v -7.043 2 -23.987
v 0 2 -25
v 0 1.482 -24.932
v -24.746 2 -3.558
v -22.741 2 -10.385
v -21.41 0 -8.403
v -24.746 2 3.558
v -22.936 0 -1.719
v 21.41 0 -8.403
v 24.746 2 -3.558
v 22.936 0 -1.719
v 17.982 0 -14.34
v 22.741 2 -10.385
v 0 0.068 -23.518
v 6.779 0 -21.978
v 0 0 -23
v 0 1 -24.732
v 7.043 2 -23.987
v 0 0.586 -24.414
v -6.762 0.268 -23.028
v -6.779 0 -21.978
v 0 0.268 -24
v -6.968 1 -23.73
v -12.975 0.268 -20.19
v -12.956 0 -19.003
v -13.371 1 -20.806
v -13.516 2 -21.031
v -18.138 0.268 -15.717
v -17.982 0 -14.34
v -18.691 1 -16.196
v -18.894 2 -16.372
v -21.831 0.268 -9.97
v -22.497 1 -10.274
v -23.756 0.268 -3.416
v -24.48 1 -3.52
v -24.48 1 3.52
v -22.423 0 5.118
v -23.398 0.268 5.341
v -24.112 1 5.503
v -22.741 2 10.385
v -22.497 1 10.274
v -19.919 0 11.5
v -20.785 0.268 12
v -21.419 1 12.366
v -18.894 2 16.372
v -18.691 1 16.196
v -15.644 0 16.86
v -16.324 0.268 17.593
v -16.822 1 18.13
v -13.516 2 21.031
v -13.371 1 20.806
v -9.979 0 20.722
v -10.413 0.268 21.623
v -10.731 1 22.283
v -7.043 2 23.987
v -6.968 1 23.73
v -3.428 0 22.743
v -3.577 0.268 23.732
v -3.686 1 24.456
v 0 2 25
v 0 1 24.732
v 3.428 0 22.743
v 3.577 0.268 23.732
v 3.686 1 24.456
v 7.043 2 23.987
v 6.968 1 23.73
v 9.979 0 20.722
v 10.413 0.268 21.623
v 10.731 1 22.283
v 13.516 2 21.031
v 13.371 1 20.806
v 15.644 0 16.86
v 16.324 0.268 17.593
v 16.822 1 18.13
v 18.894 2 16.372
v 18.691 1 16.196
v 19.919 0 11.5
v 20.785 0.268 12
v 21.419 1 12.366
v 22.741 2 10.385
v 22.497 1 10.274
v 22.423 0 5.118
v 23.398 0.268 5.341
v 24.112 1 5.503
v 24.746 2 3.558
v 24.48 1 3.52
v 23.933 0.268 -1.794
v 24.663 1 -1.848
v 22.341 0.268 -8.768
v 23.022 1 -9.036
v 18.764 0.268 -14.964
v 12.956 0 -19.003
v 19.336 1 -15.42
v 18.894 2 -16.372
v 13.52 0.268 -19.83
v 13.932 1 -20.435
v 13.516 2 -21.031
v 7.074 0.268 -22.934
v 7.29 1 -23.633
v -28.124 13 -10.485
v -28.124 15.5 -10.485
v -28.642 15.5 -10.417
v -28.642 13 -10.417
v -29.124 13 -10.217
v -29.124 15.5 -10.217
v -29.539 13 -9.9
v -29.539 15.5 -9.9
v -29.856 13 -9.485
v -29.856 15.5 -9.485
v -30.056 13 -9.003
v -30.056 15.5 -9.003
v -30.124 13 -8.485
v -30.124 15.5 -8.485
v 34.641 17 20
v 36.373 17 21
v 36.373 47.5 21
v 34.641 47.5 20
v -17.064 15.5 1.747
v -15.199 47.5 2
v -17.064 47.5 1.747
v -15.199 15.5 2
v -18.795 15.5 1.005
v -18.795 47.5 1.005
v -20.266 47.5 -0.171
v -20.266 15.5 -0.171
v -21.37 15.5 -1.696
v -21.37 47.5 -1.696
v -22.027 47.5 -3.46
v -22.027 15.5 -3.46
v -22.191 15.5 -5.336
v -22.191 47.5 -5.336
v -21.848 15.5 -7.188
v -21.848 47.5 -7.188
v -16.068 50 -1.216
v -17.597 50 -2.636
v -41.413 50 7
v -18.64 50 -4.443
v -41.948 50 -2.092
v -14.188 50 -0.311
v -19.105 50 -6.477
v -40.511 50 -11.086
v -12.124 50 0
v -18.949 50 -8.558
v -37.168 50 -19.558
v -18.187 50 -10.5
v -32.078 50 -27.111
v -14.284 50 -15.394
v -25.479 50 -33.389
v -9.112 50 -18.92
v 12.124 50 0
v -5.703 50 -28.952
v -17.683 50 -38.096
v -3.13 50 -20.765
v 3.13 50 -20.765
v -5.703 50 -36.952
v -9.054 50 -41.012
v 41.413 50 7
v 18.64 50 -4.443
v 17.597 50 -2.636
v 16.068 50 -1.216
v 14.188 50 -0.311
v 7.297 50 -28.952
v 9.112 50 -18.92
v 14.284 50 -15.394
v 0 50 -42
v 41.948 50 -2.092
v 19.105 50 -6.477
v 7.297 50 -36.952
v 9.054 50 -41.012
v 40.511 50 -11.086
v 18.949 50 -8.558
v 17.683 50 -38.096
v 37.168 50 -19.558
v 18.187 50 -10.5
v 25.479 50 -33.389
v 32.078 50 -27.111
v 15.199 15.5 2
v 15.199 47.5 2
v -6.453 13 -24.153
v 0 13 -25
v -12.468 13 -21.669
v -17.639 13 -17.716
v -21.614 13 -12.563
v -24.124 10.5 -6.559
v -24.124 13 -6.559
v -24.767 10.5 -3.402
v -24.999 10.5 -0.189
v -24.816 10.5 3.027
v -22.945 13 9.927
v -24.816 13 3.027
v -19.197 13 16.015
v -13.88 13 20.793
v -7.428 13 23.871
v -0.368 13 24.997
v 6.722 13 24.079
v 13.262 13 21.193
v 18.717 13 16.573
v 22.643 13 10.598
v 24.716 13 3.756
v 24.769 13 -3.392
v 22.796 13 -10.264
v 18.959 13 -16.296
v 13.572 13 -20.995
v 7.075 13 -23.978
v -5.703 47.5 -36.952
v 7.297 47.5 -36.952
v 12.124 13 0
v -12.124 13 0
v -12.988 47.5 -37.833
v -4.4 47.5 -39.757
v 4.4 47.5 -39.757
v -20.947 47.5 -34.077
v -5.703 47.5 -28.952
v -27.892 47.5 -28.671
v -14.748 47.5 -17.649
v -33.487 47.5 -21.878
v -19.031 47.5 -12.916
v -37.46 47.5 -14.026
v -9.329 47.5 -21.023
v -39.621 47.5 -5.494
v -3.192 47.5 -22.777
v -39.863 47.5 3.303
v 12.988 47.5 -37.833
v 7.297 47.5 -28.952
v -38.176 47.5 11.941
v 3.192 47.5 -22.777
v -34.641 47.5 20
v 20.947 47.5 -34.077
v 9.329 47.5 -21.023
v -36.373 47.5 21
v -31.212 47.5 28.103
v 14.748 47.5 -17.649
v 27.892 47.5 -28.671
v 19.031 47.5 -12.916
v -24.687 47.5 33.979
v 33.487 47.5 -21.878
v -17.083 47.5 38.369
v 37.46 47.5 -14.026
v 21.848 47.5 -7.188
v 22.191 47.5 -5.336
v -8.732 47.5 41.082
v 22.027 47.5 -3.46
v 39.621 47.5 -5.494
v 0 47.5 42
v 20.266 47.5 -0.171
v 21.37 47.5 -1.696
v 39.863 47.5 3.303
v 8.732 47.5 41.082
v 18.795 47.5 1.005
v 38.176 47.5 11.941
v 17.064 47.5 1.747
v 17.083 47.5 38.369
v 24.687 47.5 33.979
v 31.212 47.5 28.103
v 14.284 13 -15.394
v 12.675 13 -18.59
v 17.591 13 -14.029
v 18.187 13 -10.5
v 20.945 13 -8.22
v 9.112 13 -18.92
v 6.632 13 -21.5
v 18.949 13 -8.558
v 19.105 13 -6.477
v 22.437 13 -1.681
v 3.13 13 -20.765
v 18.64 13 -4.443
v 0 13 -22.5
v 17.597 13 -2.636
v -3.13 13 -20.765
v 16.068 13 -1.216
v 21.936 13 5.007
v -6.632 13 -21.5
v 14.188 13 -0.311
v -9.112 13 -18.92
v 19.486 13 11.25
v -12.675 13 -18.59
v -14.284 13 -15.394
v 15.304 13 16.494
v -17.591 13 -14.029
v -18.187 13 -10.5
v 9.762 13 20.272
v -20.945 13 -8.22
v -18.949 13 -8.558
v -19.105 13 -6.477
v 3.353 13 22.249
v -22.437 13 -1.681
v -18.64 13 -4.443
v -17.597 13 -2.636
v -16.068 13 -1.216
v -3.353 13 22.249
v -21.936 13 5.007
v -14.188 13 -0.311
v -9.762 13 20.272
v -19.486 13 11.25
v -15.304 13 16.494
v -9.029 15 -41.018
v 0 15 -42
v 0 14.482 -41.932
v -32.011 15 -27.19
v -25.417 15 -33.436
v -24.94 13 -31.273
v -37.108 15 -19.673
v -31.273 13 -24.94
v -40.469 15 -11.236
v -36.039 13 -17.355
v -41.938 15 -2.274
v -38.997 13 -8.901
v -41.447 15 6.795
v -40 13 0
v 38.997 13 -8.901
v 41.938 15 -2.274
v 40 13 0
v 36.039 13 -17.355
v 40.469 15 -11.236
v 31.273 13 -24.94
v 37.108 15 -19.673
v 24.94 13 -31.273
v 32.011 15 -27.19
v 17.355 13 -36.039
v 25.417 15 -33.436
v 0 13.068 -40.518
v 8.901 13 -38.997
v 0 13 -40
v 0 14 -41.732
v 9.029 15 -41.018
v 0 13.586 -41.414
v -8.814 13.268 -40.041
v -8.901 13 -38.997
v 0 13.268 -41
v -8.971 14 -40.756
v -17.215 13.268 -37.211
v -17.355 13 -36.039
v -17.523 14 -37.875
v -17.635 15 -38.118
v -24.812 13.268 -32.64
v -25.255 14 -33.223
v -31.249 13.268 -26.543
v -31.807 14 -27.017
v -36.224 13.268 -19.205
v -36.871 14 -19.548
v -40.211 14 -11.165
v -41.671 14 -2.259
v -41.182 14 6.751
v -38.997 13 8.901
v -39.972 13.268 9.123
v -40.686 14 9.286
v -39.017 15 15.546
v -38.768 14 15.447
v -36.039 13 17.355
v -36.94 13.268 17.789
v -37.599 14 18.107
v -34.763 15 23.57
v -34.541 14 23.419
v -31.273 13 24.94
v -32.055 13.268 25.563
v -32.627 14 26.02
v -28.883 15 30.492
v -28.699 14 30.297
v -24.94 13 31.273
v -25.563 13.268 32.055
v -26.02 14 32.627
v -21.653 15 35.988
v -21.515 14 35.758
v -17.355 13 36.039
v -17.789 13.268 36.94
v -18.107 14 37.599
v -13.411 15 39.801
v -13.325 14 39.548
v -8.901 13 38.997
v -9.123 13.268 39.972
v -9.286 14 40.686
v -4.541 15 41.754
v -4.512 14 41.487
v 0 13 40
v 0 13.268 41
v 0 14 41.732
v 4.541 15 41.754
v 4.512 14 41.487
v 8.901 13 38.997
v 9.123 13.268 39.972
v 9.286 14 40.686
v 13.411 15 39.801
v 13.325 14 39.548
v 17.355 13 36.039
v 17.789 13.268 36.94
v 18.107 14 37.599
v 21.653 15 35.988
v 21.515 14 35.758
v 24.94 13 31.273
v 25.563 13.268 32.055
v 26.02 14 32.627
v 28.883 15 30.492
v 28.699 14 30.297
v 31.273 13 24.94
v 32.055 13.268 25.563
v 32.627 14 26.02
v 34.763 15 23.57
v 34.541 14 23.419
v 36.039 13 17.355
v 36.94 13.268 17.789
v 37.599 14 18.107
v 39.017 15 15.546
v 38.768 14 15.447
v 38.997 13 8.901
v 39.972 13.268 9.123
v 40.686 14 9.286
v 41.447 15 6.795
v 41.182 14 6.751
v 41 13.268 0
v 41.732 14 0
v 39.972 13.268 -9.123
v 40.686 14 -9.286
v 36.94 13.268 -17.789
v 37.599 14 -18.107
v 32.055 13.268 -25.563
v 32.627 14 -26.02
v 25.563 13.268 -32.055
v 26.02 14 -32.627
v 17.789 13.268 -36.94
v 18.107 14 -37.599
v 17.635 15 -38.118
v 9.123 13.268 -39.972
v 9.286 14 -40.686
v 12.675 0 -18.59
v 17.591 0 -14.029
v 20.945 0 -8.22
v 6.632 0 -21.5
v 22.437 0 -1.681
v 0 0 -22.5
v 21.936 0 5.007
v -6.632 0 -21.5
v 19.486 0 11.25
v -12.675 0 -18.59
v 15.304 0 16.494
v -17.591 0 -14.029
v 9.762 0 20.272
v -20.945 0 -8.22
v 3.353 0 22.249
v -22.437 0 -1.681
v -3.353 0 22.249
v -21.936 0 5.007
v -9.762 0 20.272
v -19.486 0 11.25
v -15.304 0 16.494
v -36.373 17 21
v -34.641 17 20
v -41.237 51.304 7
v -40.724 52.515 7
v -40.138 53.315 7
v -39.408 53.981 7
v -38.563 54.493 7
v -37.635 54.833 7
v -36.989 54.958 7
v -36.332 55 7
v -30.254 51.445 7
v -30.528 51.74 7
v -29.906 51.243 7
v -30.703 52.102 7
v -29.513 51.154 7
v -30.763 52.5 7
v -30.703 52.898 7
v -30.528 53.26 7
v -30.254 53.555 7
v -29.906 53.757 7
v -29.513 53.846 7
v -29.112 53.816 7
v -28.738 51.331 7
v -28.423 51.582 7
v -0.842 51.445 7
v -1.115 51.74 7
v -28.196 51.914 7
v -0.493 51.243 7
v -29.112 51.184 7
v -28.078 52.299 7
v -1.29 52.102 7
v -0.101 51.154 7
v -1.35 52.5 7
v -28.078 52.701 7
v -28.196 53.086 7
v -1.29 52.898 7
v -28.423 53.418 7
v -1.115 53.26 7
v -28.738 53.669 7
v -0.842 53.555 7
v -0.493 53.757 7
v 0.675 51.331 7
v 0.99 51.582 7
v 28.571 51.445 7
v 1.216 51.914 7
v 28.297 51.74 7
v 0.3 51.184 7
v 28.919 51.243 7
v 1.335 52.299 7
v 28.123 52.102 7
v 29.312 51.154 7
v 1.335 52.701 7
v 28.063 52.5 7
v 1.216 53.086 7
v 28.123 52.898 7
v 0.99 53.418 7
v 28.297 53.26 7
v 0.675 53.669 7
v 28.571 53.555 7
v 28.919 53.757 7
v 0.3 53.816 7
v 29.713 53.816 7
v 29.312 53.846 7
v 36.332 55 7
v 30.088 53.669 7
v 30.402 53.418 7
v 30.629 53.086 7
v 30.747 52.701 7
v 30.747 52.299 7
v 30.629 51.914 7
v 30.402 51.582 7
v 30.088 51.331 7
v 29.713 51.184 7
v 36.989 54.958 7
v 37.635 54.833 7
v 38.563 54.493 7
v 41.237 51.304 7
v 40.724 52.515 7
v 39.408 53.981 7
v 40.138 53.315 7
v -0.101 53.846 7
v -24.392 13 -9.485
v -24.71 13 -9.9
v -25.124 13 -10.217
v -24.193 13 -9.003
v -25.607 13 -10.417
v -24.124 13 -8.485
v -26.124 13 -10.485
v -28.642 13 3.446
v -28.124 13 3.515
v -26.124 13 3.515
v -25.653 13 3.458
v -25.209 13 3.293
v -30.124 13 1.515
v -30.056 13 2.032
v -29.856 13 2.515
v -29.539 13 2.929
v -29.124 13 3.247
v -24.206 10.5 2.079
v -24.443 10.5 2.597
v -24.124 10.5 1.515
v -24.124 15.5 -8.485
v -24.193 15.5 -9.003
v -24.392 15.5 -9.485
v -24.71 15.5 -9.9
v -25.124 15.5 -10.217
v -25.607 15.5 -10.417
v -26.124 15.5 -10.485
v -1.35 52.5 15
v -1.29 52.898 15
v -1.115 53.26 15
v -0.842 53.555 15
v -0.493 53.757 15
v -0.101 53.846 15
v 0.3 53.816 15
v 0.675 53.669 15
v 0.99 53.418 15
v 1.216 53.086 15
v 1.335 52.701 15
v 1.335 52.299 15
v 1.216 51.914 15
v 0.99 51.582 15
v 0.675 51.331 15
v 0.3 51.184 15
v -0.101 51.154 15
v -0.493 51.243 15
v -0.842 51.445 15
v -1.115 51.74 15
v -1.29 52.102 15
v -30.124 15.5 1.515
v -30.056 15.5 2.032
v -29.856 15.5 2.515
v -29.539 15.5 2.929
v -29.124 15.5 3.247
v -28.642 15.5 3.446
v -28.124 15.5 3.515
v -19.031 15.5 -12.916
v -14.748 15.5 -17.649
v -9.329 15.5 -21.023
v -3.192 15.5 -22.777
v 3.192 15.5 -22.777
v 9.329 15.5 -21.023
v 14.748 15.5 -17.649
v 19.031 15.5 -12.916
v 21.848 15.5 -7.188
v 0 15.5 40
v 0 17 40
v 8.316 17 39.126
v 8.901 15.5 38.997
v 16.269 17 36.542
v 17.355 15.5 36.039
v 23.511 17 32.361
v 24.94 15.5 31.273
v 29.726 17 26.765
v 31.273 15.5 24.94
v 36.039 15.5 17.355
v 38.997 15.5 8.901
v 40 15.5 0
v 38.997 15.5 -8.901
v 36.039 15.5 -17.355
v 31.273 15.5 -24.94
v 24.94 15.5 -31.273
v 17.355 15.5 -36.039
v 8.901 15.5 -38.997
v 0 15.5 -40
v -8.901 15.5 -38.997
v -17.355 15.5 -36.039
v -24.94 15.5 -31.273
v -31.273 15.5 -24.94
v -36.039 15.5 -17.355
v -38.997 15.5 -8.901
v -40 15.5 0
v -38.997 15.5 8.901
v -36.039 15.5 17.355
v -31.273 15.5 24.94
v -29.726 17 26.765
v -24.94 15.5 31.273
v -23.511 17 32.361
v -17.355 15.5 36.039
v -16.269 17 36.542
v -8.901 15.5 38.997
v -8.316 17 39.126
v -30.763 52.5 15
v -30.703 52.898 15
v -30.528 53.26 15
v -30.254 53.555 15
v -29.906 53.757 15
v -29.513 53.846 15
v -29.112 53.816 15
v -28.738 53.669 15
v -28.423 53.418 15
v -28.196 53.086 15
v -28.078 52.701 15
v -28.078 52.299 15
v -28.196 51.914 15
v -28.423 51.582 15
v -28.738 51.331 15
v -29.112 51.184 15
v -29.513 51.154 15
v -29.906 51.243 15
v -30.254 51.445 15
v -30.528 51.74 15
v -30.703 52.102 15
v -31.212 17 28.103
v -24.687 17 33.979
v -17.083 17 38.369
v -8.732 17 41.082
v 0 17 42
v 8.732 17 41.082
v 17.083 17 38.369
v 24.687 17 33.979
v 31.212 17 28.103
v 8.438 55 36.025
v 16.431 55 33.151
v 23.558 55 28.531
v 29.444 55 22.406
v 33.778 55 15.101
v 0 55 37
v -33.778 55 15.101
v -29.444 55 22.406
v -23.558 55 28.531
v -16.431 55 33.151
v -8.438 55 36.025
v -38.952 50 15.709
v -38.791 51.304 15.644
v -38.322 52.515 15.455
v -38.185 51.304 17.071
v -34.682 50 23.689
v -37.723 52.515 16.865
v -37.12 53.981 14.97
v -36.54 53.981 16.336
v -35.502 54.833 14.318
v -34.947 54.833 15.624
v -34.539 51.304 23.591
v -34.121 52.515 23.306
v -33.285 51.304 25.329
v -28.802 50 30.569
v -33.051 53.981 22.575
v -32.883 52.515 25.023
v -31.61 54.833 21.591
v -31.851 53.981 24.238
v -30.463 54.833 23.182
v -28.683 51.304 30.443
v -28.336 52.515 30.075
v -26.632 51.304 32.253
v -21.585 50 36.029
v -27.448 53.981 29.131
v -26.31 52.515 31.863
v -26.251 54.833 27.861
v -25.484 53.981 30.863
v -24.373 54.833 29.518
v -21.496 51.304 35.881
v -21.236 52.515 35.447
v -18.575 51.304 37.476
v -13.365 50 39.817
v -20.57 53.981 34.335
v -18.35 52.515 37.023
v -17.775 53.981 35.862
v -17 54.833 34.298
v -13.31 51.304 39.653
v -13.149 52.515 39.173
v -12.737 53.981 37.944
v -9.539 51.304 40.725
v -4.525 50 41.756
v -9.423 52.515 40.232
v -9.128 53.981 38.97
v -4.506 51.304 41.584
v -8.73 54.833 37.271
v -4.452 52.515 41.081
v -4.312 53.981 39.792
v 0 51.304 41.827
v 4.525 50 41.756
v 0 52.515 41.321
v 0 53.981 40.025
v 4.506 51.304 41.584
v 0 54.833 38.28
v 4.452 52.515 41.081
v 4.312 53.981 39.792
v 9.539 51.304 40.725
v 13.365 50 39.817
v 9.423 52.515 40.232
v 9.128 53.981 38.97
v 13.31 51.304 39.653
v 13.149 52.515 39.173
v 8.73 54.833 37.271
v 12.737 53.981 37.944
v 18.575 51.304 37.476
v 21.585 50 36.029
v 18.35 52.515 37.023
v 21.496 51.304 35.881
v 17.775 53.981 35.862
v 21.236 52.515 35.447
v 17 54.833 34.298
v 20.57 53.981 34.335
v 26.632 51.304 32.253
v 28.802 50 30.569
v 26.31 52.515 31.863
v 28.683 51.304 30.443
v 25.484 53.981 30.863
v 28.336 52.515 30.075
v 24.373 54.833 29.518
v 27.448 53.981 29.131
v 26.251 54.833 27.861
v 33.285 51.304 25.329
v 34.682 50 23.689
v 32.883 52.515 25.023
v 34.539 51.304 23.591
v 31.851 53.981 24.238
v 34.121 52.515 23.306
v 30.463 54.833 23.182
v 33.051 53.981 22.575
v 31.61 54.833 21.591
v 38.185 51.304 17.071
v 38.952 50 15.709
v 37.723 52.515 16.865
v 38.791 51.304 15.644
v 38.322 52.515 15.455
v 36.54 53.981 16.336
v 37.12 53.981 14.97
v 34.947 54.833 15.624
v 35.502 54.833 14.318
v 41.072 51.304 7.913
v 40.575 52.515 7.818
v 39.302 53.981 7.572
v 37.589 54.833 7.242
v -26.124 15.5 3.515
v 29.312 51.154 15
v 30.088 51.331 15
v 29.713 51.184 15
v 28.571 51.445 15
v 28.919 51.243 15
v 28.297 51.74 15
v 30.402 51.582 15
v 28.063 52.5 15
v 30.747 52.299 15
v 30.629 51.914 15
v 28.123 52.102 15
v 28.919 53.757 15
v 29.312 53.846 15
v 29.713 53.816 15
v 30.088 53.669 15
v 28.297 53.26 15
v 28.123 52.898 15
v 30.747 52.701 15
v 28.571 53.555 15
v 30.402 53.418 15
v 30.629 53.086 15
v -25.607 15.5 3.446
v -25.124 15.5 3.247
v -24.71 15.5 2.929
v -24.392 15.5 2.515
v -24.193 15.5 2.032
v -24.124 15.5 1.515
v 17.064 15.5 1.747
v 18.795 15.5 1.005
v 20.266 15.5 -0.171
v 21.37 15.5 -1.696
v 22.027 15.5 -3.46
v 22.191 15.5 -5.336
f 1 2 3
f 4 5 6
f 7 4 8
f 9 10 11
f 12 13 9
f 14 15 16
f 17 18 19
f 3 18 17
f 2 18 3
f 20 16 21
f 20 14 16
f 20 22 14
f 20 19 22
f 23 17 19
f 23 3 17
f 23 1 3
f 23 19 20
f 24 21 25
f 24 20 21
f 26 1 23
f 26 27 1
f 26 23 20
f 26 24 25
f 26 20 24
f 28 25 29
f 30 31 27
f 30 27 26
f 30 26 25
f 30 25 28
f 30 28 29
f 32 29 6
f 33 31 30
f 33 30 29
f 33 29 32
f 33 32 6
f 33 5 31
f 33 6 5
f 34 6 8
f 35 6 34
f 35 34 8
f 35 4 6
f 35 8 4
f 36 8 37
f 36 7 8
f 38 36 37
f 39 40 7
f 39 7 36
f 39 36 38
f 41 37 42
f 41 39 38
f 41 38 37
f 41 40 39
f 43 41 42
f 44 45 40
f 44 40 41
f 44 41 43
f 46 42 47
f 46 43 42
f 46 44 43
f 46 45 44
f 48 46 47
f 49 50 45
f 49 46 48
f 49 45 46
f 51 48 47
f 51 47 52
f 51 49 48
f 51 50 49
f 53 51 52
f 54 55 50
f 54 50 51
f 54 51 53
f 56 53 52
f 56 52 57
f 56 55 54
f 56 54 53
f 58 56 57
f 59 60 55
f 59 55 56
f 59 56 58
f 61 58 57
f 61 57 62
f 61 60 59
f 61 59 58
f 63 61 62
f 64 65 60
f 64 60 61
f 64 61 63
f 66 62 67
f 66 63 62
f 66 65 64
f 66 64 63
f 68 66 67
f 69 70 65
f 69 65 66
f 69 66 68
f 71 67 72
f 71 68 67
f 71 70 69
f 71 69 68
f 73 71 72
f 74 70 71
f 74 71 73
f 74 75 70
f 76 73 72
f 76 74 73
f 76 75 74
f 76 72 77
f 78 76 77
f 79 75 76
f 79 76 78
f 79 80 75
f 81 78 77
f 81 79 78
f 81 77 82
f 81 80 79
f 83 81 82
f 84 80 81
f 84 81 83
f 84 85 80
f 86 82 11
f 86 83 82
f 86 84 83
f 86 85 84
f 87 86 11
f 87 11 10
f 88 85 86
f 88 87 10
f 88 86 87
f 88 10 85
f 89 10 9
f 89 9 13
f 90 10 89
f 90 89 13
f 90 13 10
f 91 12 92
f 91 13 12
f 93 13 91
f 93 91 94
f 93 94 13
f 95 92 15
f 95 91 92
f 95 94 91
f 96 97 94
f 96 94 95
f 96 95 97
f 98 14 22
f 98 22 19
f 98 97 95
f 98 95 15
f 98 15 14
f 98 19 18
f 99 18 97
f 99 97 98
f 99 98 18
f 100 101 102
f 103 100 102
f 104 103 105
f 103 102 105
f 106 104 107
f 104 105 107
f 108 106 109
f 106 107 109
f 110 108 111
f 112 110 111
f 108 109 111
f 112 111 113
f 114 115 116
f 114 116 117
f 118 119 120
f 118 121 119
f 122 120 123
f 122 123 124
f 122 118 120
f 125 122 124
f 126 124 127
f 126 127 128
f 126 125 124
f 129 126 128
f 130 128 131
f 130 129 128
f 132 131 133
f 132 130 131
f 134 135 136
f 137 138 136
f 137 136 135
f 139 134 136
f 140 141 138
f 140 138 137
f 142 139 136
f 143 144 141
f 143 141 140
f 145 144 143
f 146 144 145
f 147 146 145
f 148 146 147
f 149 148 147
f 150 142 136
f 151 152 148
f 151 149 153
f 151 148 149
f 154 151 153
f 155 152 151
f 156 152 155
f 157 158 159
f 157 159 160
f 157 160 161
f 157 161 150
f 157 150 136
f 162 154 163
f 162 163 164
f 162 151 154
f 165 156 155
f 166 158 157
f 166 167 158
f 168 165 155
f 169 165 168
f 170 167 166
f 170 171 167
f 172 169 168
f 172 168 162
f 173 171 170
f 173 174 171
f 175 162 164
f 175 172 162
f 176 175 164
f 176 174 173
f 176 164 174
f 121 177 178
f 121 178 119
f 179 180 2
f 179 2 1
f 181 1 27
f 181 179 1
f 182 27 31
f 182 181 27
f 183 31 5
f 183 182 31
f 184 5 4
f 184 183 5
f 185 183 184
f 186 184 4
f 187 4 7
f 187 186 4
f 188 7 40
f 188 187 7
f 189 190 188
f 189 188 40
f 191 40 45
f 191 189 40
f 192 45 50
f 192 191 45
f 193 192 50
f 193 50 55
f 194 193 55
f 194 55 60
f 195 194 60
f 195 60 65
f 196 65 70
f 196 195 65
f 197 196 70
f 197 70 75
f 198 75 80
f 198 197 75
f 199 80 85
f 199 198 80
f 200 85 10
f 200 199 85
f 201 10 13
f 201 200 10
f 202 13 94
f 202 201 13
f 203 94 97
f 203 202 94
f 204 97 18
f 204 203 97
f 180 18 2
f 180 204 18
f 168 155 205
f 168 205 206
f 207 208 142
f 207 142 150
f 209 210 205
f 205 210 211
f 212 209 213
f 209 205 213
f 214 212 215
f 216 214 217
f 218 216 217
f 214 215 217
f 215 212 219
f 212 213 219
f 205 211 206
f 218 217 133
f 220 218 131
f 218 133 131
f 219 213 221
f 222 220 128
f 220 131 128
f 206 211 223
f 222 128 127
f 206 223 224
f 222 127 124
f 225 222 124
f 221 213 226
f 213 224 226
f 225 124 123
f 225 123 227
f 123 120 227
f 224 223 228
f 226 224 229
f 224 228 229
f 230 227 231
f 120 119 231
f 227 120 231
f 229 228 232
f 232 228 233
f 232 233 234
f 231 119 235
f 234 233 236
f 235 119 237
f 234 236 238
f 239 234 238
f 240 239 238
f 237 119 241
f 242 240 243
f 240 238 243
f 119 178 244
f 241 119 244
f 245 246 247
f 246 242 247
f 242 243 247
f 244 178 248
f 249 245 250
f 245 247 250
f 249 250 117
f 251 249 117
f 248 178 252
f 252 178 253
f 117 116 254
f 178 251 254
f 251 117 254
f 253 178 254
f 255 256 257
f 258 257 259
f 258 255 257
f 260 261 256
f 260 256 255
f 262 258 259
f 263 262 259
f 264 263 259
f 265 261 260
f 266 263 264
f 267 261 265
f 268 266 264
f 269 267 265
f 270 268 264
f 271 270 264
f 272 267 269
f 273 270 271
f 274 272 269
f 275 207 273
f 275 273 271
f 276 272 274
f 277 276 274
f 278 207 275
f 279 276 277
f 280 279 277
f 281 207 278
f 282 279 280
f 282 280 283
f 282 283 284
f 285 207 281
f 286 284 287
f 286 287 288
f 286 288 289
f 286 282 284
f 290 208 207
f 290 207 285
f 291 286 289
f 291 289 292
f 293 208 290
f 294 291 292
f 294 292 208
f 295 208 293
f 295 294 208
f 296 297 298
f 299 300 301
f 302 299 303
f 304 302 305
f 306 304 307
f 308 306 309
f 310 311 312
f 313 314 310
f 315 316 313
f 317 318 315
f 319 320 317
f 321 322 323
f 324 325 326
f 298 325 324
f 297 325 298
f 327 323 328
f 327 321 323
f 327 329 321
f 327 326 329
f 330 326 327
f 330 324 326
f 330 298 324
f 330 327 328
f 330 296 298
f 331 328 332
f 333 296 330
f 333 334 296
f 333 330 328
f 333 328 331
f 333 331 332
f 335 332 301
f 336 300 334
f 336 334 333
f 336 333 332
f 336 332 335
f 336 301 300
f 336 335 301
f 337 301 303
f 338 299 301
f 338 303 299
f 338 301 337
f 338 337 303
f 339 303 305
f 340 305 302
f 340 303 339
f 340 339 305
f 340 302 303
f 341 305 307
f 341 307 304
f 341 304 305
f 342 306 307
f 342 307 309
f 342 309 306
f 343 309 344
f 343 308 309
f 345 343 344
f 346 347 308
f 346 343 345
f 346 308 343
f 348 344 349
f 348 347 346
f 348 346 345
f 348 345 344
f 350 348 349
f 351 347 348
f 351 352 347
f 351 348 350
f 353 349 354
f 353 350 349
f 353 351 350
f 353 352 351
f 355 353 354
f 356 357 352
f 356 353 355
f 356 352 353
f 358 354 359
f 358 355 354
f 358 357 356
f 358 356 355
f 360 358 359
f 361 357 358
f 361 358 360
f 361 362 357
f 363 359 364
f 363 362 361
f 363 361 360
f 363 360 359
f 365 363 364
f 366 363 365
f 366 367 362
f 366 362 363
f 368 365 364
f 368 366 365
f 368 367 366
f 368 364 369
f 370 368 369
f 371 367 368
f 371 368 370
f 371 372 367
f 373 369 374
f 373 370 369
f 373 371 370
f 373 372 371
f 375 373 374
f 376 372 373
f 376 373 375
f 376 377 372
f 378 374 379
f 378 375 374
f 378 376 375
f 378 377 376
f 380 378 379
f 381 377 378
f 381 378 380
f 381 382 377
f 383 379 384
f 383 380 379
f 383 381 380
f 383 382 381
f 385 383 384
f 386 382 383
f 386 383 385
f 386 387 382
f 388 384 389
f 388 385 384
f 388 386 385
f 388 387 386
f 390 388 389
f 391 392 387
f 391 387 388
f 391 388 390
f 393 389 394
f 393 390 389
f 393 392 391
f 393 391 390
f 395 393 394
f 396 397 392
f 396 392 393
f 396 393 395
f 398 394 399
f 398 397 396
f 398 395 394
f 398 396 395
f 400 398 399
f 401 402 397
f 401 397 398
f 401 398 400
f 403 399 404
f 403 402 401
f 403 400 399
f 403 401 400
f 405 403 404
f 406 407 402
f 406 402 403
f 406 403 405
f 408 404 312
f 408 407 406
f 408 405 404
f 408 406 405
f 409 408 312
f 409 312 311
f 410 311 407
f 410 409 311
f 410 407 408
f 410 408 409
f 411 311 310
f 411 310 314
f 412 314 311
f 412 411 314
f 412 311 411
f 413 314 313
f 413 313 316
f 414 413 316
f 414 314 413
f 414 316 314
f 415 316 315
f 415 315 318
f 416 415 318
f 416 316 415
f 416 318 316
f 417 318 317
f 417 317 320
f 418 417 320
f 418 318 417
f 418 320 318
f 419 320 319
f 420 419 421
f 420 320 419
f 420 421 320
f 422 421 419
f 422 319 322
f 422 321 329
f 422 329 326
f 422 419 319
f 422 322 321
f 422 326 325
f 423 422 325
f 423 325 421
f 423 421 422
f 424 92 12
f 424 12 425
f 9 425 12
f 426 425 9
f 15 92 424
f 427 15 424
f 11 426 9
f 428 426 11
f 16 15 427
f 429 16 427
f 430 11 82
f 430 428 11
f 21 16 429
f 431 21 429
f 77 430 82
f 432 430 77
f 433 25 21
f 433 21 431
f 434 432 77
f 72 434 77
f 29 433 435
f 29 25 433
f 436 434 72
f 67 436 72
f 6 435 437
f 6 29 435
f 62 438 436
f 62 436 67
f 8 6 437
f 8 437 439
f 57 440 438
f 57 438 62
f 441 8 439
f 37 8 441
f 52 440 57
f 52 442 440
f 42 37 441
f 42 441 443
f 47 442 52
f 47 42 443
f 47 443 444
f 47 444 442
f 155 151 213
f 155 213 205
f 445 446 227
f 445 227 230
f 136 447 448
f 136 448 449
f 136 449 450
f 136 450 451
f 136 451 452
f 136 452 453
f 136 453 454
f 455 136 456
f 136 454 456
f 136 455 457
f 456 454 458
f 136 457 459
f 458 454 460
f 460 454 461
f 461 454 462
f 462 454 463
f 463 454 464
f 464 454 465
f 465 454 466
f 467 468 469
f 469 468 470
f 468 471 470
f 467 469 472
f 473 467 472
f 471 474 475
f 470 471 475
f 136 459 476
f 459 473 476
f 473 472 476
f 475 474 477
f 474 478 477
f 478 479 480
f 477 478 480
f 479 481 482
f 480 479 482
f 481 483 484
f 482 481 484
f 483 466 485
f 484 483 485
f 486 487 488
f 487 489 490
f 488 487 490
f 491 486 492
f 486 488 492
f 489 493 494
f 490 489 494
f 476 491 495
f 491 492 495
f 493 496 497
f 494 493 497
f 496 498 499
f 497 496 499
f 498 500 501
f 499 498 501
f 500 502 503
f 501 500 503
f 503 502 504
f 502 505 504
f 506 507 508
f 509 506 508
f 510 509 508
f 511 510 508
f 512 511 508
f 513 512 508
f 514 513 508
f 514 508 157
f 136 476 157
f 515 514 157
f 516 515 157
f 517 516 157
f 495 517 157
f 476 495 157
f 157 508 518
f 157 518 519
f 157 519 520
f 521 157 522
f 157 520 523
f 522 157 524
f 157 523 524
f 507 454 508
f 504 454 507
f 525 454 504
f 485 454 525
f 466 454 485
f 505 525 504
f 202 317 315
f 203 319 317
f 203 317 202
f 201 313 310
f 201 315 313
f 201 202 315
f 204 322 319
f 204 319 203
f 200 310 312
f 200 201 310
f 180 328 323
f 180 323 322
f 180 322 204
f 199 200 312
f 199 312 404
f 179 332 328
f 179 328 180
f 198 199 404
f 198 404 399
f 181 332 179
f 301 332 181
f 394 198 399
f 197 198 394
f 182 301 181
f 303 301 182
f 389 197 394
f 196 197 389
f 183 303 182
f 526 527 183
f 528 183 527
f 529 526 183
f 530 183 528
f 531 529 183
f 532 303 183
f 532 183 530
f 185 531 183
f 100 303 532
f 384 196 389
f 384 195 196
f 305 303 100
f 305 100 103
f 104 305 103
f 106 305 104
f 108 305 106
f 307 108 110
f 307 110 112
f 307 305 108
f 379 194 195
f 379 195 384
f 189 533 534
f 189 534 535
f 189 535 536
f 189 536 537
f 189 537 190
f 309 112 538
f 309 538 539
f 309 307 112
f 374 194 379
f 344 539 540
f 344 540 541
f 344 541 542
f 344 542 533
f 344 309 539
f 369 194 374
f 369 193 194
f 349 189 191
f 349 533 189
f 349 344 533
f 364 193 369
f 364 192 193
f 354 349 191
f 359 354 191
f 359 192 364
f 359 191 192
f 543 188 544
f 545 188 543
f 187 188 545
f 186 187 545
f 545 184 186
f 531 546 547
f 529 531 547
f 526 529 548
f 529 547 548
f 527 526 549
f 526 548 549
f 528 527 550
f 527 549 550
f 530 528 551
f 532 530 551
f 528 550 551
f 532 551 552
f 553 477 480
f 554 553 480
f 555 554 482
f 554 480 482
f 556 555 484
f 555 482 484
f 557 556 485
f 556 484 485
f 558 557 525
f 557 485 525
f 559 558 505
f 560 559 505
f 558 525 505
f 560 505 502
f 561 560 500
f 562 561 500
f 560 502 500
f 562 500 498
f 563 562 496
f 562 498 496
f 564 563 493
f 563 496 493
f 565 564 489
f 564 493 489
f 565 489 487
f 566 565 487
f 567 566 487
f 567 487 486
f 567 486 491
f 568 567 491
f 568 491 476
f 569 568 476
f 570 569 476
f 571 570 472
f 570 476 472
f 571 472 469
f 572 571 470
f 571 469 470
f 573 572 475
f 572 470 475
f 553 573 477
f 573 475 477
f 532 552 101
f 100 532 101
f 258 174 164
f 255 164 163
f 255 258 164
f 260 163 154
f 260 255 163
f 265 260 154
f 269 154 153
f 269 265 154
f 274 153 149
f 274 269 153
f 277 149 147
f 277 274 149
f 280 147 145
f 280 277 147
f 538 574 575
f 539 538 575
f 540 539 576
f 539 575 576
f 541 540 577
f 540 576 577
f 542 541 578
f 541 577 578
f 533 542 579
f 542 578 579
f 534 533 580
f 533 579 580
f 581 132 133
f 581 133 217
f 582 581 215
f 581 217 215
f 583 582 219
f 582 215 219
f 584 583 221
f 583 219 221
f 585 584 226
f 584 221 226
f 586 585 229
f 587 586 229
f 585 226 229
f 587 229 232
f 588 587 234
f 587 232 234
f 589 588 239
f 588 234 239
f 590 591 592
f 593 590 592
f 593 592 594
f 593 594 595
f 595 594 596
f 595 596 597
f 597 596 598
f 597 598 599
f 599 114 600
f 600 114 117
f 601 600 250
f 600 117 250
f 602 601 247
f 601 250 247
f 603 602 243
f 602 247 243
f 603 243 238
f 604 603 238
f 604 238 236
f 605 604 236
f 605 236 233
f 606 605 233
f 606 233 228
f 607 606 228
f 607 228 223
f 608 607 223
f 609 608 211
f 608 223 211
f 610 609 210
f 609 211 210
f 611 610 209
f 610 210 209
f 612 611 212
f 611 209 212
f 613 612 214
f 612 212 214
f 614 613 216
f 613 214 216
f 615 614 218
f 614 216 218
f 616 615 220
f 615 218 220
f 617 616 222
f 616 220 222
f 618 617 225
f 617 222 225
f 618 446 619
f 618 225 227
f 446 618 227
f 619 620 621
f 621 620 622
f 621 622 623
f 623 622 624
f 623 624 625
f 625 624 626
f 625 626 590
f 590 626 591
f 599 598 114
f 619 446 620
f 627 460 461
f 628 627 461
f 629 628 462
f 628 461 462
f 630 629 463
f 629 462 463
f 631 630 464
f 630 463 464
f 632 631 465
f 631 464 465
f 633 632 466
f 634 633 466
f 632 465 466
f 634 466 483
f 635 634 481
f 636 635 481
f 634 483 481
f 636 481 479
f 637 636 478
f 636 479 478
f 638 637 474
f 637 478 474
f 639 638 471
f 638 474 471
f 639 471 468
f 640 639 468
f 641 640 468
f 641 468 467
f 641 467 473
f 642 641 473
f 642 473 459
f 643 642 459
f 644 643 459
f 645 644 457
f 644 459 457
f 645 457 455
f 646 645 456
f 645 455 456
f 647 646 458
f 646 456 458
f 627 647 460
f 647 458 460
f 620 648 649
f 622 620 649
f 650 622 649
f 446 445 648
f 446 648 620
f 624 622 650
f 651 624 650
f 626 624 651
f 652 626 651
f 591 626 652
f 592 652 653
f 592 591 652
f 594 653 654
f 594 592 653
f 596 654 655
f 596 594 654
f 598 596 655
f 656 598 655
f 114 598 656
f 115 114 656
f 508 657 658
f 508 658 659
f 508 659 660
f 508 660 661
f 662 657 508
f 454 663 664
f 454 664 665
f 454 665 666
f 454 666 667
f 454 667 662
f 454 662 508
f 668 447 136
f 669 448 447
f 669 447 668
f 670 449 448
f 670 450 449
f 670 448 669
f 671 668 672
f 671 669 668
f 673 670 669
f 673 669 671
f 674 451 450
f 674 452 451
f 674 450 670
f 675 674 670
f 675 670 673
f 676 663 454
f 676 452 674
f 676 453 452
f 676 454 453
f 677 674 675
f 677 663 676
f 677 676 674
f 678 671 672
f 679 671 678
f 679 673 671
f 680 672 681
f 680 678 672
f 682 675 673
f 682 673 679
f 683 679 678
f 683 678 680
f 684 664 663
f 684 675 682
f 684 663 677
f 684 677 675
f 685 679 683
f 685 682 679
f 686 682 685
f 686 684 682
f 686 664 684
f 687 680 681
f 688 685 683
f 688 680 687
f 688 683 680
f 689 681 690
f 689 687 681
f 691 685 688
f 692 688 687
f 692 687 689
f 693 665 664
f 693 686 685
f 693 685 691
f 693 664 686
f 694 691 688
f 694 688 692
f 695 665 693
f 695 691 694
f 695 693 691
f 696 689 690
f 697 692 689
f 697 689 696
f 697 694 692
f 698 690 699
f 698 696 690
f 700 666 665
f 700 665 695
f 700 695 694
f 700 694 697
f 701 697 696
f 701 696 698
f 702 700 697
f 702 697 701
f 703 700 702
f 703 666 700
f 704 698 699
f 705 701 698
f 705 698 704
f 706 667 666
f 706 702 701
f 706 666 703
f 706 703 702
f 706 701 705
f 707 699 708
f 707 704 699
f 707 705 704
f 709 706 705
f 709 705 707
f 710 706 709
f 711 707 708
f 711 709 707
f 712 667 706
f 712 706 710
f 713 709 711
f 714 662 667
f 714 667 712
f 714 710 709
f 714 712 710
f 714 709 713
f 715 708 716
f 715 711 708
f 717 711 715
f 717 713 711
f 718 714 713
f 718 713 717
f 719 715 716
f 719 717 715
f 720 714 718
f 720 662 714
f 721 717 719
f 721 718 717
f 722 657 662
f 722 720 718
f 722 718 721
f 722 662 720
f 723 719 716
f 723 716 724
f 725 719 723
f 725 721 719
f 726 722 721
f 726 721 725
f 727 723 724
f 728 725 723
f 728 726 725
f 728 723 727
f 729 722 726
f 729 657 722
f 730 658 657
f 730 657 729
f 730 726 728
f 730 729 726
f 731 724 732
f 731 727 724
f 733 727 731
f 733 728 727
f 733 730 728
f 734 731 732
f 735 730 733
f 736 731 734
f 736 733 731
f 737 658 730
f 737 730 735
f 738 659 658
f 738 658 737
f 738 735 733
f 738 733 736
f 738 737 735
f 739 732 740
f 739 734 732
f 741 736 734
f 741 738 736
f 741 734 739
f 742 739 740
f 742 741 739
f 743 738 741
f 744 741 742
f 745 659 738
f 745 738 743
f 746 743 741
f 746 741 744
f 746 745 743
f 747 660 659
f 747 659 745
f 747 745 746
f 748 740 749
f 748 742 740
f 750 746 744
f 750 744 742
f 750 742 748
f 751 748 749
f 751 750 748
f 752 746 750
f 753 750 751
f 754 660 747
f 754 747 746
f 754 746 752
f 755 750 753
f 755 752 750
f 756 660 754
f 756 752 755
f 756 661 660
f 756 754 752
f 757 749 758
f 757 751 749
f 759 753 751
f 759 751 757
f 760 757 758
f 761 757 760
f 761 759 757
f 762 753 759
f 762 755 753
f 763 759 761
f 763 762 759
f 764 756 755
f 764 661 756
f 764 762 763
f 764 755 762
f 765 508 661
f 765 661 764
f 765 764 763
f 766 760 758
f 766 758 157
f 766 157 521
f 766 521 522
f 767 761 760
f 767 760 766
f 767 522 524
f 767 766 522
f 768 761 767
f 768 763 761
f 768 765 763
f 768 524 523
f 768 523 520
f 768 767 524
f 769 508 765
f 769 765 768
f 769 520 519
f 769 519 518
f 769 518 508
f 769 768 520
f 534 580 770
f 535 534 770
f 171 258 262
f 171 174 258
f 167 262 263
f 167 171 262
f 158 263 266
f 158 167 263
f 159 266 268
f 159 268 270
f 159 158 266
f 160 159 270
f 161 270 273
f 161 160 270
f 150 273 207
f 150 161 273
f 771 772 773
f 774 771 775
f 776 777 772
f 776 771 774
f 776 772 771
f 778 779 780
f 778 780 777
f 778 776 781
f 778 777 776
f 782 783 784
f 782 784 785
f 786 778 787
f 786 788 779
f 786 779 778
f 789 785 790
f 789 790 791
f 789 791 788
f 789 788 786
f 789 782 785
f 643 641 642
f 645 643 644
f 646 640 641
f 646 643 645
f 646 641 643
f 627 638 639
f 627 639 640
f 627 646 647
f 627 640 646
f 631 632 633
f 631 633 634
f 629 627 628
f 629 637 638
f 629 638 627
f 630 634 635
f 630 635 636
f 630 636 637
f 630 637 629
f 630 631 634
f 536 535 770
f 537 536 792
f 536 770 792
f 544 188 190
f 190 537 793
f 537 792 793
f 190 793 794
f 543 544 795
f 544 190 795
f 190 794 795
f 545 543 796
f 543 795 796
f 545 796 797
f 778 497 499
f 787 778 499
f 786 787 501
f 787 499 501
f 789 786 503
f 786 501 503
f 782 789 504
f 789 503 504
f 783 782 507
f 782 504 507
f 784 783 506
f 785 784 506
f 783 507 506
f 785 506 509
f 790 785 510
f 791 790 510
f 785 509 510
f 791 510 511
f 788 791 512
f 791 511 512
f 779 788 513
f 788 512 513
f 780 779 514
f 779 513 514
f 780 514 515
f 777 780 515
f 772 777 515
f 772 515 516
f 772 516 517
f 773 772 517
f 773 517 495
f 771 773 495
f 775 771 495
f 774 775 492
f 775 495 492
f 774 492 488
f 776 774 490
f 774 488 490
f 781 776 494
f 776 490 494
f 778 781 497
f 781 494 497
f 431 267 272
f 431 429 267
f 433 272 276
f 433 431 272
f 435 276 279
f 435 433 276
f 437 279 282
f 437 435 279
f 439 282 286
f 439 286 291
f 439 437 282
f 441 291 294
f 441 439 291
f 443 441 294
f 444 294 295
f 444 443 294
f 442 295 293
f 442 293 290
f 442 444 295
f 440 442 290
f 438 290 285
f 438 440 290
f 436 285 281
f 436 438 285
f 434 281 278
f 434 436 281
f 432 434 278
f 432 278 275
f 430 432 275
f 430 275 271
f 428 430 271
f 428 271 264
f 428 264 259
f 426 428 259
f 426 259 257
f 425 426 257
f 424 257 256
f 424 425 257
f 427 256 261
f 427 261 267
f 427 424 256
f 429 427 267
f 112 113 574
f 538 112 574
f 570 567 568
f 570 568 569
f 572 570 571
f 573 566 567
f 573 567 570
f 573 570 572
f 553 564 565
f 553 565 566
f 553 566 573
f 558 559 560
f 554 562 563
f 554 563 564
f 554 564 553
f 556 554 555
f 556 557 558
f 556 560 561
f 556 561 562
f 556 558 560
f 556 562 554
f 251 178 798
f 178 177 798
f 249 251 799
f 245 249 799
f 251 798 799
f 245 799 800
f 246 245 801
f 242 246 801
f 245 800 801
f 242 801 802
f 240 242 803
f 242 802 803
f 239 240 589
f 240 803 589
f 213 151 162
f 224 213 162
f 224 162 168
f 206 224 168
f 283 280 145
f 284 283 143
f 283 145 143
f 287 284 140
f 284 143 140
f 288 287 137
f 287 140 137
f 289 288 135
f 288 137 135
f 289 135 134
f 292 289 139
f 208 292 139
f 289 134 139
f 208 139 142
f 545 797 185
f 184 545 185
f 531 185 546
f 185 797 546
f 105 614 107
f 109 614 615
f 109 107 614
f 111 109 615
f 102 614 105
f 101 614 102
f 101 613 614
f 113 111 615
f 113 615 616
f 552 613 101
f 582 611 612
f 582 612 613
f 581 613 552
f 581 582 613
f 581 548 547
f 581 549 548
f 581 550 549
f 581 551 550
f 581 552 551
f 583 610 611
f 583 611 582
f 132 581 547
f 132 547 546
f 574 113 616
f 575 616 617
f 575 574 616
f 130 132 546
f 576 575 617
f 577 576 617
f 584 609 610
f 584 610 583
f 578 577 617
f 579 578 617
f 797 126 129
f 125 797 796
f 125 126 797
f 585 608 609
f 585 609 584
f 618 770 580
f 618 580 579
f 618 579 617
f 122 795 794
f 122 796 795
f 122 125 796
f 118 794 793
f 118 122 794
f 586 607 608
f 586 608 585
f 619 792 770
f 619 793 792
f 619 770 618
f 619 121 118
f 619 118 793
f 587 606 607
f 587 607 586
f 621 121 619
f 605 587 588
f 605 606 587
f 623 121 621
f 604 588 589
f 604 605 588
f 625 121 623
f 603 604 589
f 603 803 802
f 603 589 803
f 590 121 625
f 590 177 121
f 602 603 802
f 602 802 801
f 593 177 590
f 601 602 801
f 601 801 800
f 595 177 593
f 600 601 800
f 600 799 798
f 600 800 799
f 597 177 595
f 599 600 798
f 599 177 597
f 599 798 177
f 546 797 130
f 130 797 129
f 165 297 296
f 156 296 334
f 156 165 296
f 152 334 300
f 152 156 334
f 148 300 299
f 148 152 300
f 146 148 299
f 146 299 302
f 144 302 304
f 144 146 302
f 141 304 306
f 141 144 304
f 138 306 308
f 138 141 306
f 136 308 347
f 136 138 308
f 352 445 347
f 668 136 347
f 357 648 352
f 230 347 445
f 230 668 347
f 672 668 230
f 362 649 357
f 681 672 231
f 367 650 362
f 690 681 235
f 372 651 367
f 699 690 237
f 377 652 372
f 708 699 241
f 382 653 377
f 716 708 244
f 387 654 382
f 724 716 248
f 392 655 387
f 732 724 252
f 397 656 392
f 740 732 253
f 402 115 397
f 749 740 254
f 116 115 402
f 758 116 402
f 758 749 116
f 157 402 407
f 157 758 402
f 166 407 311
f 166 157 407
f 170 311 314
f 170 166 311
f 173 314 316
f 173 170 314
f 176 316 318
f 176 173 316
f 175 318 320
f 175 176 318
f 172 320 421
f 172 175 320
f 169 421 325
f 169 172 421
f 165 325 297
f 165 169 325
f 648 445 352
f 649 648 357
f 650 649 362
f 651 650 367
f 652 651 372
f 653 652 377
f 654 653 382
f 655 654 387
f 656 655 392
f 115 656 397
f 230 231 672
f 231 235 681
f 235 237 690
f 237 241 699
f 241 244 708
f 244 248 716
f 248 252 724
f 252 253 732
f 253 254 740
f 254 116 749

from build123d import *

# Parameters (mm, degrees)
CUT_EXTRUDE1_DEPTH  = 5
CUT_EXTRUDE3_DEPTH  = 45
SKETCH8_R           = 40
CUT_EXTRUDE4_DEPTH  = 32
FILLET1_R           = 7
FILLET2_R           = 7
CUT_REVOLVE1_START  = 17
CUT_REVOLVE1_DEPTH  = 30.5
CUT_EXTRUDE12_DEPTH = 5
SKETCH18_W          = 13
SKETCH18_H          = 8
CUT_EXTRUDE13_DEPTH = 5
SKETCH20_W          = 84
SKETCH20_H          = 7
CUT_EXTRUDE15_DEPTH = 5
SKETCH19_R          = 1.35
CUT_EXTRUDE14_DEPTH = 8


# Read off the part's stored shape, not the designer's step: Cut-Revolve1
with BuildPart() as part:
    # Sketch1 → Revolve1 (revolve)
    with BuildSketch(Plane.XY, mode=Mode.PRIVATE) as revolve1_sk:
        with BuildLine():
            Line((22.5, 0), (23, 0))
            ThreePointArc((23, 0), (24.414213562, 0.585786438), (25, 2))
            Line((25, 2), (25, 13))
            Line((25, 13), (40, 13))
            ThreePointArc((40, 13), (41.414213562, 13.585786438), (42, 15))
            Line((42, 15), (42, 50))
            ThreePointArc((42, 50), (40.535533906, 53.535533906), (37, 55))
            Line((37, 55), (0, 55))
            Line((0, 55), (0, 13))
            Line((0, 13), (22.5, 13))
            Line((22.5, 13), (22.5, 0))
        make_face()
    revolve(revolve1_sk.sketch.rotate(Axis((0, 2, 0), (0, 1, 0)), 90), axis=Axis((0, 2, 0), (0, 1, 0)))

    # Sketch5 → Cut-Extrude1 (cut)
    with BuildSketch(Plane(origin=(0, 55, 0), x_dir=(1, 0, 0), z_dir=(0, 1, 0))):
        with BuildLine():
            Line((-42, 0), (-40, 0))
            Line((-40, 0), (40, 0))
            Line((40, 0), (42, 0))
            ThreePointArc((42, 0), (0, 42), (-42, 0))
        make_face()
    extrude(amount=-CUT_EXTRUDE1_DEPTH, mode=Mode.SUBTRACT)

    # Sketch7 → Cut-Extrude3 (cut)
    with BuildSketch(Plane.XZ.offset(-13)):
        with BuildLine():
            Line((-21, 0), (21, 0))
            ThreePointArc((21, 0), (0, -21), (-21, 0))
        make_face()
    extrude(amount=-CUT_EXTRUDE3_DEPTH, mode=Mode.SUBTRACT)

    # Sketch8 → Cut-Extrude4 (cut)
    with BuildSketch(Plane(origin=(0, 47.5, 0), x_dir=(1, 0, 0), z_dir=(0, 1, 0))):
        with Locations(Location((0, 0, 0), (0, 0, 270))):
            Circle(SKETCH8_R)
        with BuildLine():
            Line((22.912878475, -2), (-22.912878475, -2))
            ThreePointArc((-22.912878475, -2), (0, 23), (22.912878475, -2))
        make_face(mode=Mode.SUBTRACT)
    extrude(amount=-CUT_EXTRUDE4_DEPTH, mode=Mode.SUBTRACT)

    # Fillet1
    fillet1_edges = [part.edges().sort_by_distance(p)[0] for p in [
        (21, 31.5, 0),
        (-21, 31.5, 0),
    ]]
    fillet(fillet1_edges, radius=FILLET1_R)

    # Fillet2
    fillet2_edges = [part.edges().sort_by_distance(p)[0] for p in [
        (-22.912878475, 31.5, 2),
        (22.912878475, 31.5, 2),
    ]]
    fillet(fillet2_edges, radius=FILLET2_R)

    # Cut-Revolve1 outline → Cut-Revolve1 (cut)
    with BuildSketch(Plane(origin=(0, 0, 0), x_dir=(1, 0, 0), z_dir=(0, 1, 0)).offset(CUT_REVOLVE1_START)):
        with BuildLine():
            Line((-34.641016151, -20), (-36.373066959, -21))
            ThreePointArc((-36.373066959, -21), (0, -42), (36.373066959, -21))
            Line((36.373066959, -21), (34.641016151, -20))
            ThreePointArc((34.641016151, -20), (0, -40), (-34.641016151, -20))
        make_face()
    extrude(amount=CUT_REVOLVE1_DEPTH, mode=Mode.SUBTRACT)

    # Sketch15 → Cut-Extrude12 (cut)
    with BuildSketch(Plane(origin=(0, 15.5, 0), x_dir=(1, 0, 0), z_dir=(0, 1, 0))):
        with BuildLine():
            Line((-28.124355653, -3.514579578), (-26.124355653, -3.514579578))
            ThreePointArc((-26.124355653, -3.514579578), (-24.710142091, -2.928793141), (-24.124355653, -1.514579578))
            Line((-24.124355653, -1.514579578), (-24.124355653, 8.485420422))
            ThreePointArc((-24.124355653, 8.485420422), (-24.710142091, 9.899633984), (-26.124355653, 10.485420422))
            Line((-26.124355653, 10.485420422), (-28.124355653, 10.485420422))
            ThreePointArc((-28.124355653, 10.485420422), (-29.538569215, 9.899633984), (-30.124355653, 8.485420422))
            Line((-30.124355653, 8.485420422), (-30.124355653, -1.514579578))
            ThreePointArc((-30.124355653, -1.514579578), (-29.538569215, -2.928793141), (-28.124355653, -3.514579578))
        make_face()
    extrude(amount=-CUT_EXTRUDE12_DEPTH, mode=Mode.SUBTRACT)

    # Sketch18 → Cut-Extrude13 (cut)
    with BuildSketch(Plane(origin=(0, 50, 0), x_dir=(1, 0, 0), z_dir=(0, 1, 0))):
        with Locations((0.796512215, 32.951769165)):
            Rectangle(SKETCH18_W, SKETCH18_H)
    extrude(amount=-CUT_EXTRUDE13_DEPTH, mode=Mode.SUBTRACT)

    # Sketch20 → Cut-Extrude15 (cut)
    with BuildSketch(Plane(origin=(0, 55, 0), x_dir=(1, 0, 0), z_dir=(0, 1, 0))):
        with Locations((0, -3.5)):
            Rectangle(SKETCH20_W, SKETCH20_H)
    extrude(amount=-CUT_EXTRUDE15_DEPTH, mode=Mode.SUBTRACT)

    # Sketch19 → Cut-Extrude14 (cut)
    with BuildSketch(Plane(origin=(0, 0, 7), x_dir=(-1, 0, 0), z_dir=(0, 0, -1))):
        with Locations((0, 52.5)):
            Circle(SKETCH19_R)
        with Locations((-29.412558482, 52.5)):
            Circle(SKETCH19_R)
        with Locations((29.412558482, 52.5)):
            Circle(SKETCH19_R)
    extrude(amount=-CUT_EXTRUDE14_DEPTH, mode=Mode.SUBTRACT)


solid = part.part
